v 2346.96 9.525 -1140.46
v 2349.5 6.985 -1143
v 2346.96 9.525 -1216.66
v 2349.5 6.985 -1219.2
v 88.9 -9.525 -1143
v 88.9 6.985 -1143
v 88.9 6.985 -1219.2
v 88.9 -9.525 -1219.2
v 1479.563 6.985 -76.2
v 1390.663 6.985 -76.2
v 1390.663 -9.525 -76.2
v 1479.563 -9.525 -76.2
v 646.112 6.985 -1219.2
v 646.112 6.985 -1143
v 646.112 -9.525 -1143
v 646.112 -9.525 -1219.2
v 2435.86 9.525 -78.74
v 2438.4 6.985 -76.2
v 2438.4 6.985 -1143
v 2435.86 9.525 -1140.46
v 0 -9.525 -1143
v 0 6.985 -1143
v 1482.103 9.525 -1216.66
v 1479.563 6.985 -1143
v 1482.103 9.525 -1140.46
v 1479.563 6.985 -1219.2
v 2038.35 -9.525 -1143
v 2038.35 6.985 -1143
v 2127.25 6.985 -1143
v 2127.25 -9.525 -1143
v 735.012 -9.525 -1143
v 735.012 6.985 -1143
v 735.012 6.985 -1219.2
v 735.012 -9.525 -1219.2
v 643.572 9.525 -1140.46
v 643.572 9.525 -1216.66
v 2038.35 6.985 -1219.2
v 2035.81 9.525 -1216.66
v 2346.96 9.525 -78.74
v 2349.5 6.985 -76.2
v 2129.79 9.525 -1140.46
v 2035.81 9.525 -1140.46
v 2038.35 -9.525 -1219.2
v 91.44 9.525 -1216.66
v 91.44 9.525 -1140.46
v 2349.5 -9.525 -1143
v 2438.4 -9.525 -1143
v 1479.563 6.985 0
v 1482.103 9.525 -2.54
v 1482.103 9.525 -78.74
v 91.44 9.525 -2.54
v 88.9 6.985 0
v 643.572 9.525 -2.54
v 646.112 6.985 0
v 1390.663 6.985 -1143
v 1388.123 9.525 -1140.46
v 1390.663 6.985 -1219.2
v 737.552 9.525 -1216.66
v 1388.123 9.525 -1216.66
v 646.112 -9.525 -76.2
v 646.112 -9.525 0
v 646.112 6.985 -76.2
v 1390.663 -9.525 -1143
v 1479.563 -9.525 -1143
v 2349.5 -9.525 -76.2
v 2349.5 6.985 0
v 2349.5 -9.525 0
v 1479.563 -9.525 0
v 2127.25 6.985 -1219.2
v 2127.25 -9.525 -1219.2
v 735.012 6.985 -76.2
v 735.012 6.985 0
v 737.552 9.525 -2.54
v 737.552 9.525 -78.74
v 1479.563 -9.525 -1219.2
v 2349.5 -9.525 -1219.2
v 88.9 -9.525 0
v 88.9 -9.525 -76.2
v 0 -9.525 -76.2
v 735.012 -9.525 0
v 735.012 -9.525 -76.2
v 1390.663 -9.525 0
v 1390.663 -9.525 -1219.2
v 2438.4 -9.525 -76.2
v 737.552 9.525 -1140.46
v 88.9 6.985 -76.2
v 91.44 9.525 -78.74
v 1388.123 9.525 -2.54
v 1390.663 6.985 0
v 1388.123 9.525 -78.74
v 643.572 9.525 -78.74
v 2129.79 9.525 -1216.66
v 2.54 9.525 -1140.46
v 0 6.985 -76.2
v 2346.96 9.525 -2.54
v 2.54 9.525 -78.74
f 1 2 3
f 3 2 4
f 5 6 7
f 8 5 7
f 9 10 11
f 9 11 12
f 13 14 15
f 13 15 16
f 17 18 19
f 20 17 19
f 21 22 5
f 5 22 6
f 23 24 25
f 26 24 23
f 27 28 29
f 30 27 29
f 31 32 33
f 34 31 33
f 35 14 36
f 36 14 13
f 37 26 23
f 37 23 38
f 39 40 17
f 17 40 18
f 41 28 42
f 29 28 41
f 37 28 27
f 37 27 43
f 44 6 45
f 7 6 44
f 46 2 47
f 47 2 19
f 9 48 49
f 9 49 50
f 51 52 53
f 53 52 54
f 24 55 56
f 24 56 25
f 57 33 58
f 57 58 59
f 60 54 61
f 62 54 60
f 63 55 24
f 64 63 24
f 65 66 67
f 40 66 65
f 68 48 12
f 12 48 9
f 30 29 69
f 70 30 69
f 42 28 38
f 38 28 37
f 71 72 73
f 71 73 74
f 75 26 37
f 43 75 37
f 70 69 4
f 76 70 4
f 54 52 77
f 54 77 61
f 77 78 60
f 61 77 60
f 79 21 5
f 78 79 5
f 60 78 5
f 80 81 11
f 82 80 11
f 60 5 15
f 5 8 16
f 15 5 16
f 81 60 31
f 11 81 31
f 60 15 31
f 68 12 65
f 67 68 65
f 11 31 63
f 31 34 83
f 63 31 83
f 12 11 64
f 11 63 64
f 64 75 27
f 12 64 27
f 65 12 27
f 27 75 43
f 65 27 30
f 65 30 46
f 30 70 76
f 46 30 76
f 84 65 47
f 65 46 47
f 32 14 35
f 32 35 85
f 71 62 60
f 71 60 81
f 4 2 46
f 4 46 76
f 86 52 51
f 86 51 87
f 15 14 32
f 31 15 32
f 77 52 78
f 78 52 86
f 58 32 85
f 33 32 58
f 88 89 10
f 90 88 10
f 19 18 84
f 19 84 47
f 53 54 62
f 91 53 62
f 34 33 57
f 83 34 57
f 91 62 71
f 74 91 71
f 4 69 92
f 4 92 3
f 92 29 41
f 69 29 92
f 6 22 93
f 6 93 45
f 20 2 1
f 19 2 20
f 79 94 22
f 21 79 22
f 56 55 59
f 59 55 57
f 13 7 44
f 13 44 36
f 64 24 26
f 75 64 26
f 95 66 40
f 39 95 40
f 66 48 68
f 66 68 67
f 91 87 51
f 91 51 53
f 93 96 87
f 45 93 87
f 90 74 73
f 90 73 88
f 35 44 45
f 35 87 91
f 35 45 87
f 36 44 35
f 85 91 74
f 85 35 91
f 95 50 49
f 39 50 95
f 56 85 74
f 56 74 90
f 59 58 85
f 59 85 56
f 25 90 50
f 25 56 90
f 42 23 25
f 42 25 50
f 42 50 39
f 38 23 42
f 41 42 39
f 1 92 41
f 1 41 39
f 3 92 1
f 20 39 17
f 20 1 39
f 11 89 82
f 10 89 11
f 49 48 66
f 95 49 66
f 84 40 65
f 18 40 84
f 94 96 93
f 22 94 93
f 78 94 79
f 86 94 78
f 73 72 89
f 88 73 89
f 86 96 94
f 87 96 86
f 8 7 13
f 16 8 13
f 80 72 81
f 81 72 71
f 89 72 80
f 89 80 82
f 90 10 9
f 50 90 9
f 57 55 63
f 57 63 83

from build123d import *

# Parameters (mm, degrees)
SKETCH1_W           = 2438.4
SKETCH1_H           = 1219.2
BOSS_EXTRUDE1_DEPTH = 9.525
SKETCH2_W           = 88.9
SKETCH2_H           = 76.2
CUT_EXTRUDE1_DEPTH  = 20.05
CHAMFER1_SIZE       = 2.54


with BuildPart() as part:
    # Sketch1 → Boss-Extrude1 (new body, symmetric)
    with BuildSketch(Plane(origin=(0, 0, 0), x_dir=(1, 0, 0), z_dir=(0, 1, 0))):
        with Locations((1219.2, 609.6)):
            Rectangle(SKETCH1_W, SKETCH1_H)
    extrude(amount=BOSS_EXTRUDE1_DEPTH, both=True)

    # Sketch2 → Cut-Extrude1 (cut, through all)
    with BuildSketch(Plane(origin=(0, 9.525, 0), x_dir=(1, 0, 0), z_dir=(0, 1, 0))):
        with Locations((44.45, 1181.1)):
            Rectangle(SKETCH2_W, SKETCH2_H)
        with Locations((690.5625, 1181.1)):
            Rectangle(SKETCH2_W, SKETCH2_H)
        with Locations((1435.1127, 1181.1)):
            Rectangle(SKETCH2_W, SKETCH2_H)
        with Locations((2082.8, 1181.1)):
            Rectangle(SKETCH2_W, SKETCH2_H)
        with Locations((2393.95, 1181.1)):
            Rectangle(SKETCH2_W, SKETCH2_H)
        with Locations((1435.1127, 38.1)):
            Rectangle(SKETCH2_W, SKETCH2_H)
        with Locations((690.5625, 38.1)):
            Rectangle(SKETCH2_W, SKETCH2_H)
        with Locations((2393.95, 38.1)):
            Rectangle(SKETCH2_W, SKETCH2_H)
        with Locations((44.45, 38.1)):
            Rectangle(SKETCH2_W, SKETCH2_H)
    extrude(amount=-CUT_EXTRUDE1_DEPTH, mode=Mode.SUBTRACT)

    # Chamfer1
    chamfer1_edges = [part.edges().sort_by_distance(p)[0] for p in [
        (646.1125, 9.525, -1181.1),
        (690.5625, 9.525, -1143),
        (735.0125, 9.525, -1181.1),
        (44.45, 9.525, -1143),
        (88.9, 9.525, -1181.1),
        (0, 9.525, -609.6),
        (367.50625, 9.525, 0),
        (1062.8376, 9.525, 0),
        (1914.53135, 9.525, 0),
        (2438.4, 9.525, -609.6),
        (2238.375, 9.525, -1219.2),
        (1758.95635, 9.525, -1219.2),
        (1062.8376, 9.525, -1219.2),
        (367.50625, 9.525, -1219.2),
        (1479.5627, 9.525, -38.1),
        (1435.1127, 9.525, -76.2),
        (1390.6627, 9.525, -38.1),
        (735.0125, 9.525, -38.1),
        (690.5625, 9.525, -76.2),
        (646.1125, 9.525, -38.1),
        (2393.95, 9.525, -76.2),
        (2349.5, 9.525, -38.1),
        (88.9, 9.525, -38.1),
        (44.45, 9.525, -76.2),
        (2349.5, 9.525, -1181.1),
        (2393.95, 9.525, -1143),
        (2038.35, 9.525, -1181.1),
        (2082.8, 9.525, -1143),
        (2127.25, 9.525, -1181.1),
        (1479.5627, 9.525, -1181.1),
        (1390.6627, 9.525, -1181.1),
        (1435.1127, 9.525, -1143),
    ]]
    chamfer(chamfer1_edges, length=CHAMFER1_SIZE)


solid = part.part
